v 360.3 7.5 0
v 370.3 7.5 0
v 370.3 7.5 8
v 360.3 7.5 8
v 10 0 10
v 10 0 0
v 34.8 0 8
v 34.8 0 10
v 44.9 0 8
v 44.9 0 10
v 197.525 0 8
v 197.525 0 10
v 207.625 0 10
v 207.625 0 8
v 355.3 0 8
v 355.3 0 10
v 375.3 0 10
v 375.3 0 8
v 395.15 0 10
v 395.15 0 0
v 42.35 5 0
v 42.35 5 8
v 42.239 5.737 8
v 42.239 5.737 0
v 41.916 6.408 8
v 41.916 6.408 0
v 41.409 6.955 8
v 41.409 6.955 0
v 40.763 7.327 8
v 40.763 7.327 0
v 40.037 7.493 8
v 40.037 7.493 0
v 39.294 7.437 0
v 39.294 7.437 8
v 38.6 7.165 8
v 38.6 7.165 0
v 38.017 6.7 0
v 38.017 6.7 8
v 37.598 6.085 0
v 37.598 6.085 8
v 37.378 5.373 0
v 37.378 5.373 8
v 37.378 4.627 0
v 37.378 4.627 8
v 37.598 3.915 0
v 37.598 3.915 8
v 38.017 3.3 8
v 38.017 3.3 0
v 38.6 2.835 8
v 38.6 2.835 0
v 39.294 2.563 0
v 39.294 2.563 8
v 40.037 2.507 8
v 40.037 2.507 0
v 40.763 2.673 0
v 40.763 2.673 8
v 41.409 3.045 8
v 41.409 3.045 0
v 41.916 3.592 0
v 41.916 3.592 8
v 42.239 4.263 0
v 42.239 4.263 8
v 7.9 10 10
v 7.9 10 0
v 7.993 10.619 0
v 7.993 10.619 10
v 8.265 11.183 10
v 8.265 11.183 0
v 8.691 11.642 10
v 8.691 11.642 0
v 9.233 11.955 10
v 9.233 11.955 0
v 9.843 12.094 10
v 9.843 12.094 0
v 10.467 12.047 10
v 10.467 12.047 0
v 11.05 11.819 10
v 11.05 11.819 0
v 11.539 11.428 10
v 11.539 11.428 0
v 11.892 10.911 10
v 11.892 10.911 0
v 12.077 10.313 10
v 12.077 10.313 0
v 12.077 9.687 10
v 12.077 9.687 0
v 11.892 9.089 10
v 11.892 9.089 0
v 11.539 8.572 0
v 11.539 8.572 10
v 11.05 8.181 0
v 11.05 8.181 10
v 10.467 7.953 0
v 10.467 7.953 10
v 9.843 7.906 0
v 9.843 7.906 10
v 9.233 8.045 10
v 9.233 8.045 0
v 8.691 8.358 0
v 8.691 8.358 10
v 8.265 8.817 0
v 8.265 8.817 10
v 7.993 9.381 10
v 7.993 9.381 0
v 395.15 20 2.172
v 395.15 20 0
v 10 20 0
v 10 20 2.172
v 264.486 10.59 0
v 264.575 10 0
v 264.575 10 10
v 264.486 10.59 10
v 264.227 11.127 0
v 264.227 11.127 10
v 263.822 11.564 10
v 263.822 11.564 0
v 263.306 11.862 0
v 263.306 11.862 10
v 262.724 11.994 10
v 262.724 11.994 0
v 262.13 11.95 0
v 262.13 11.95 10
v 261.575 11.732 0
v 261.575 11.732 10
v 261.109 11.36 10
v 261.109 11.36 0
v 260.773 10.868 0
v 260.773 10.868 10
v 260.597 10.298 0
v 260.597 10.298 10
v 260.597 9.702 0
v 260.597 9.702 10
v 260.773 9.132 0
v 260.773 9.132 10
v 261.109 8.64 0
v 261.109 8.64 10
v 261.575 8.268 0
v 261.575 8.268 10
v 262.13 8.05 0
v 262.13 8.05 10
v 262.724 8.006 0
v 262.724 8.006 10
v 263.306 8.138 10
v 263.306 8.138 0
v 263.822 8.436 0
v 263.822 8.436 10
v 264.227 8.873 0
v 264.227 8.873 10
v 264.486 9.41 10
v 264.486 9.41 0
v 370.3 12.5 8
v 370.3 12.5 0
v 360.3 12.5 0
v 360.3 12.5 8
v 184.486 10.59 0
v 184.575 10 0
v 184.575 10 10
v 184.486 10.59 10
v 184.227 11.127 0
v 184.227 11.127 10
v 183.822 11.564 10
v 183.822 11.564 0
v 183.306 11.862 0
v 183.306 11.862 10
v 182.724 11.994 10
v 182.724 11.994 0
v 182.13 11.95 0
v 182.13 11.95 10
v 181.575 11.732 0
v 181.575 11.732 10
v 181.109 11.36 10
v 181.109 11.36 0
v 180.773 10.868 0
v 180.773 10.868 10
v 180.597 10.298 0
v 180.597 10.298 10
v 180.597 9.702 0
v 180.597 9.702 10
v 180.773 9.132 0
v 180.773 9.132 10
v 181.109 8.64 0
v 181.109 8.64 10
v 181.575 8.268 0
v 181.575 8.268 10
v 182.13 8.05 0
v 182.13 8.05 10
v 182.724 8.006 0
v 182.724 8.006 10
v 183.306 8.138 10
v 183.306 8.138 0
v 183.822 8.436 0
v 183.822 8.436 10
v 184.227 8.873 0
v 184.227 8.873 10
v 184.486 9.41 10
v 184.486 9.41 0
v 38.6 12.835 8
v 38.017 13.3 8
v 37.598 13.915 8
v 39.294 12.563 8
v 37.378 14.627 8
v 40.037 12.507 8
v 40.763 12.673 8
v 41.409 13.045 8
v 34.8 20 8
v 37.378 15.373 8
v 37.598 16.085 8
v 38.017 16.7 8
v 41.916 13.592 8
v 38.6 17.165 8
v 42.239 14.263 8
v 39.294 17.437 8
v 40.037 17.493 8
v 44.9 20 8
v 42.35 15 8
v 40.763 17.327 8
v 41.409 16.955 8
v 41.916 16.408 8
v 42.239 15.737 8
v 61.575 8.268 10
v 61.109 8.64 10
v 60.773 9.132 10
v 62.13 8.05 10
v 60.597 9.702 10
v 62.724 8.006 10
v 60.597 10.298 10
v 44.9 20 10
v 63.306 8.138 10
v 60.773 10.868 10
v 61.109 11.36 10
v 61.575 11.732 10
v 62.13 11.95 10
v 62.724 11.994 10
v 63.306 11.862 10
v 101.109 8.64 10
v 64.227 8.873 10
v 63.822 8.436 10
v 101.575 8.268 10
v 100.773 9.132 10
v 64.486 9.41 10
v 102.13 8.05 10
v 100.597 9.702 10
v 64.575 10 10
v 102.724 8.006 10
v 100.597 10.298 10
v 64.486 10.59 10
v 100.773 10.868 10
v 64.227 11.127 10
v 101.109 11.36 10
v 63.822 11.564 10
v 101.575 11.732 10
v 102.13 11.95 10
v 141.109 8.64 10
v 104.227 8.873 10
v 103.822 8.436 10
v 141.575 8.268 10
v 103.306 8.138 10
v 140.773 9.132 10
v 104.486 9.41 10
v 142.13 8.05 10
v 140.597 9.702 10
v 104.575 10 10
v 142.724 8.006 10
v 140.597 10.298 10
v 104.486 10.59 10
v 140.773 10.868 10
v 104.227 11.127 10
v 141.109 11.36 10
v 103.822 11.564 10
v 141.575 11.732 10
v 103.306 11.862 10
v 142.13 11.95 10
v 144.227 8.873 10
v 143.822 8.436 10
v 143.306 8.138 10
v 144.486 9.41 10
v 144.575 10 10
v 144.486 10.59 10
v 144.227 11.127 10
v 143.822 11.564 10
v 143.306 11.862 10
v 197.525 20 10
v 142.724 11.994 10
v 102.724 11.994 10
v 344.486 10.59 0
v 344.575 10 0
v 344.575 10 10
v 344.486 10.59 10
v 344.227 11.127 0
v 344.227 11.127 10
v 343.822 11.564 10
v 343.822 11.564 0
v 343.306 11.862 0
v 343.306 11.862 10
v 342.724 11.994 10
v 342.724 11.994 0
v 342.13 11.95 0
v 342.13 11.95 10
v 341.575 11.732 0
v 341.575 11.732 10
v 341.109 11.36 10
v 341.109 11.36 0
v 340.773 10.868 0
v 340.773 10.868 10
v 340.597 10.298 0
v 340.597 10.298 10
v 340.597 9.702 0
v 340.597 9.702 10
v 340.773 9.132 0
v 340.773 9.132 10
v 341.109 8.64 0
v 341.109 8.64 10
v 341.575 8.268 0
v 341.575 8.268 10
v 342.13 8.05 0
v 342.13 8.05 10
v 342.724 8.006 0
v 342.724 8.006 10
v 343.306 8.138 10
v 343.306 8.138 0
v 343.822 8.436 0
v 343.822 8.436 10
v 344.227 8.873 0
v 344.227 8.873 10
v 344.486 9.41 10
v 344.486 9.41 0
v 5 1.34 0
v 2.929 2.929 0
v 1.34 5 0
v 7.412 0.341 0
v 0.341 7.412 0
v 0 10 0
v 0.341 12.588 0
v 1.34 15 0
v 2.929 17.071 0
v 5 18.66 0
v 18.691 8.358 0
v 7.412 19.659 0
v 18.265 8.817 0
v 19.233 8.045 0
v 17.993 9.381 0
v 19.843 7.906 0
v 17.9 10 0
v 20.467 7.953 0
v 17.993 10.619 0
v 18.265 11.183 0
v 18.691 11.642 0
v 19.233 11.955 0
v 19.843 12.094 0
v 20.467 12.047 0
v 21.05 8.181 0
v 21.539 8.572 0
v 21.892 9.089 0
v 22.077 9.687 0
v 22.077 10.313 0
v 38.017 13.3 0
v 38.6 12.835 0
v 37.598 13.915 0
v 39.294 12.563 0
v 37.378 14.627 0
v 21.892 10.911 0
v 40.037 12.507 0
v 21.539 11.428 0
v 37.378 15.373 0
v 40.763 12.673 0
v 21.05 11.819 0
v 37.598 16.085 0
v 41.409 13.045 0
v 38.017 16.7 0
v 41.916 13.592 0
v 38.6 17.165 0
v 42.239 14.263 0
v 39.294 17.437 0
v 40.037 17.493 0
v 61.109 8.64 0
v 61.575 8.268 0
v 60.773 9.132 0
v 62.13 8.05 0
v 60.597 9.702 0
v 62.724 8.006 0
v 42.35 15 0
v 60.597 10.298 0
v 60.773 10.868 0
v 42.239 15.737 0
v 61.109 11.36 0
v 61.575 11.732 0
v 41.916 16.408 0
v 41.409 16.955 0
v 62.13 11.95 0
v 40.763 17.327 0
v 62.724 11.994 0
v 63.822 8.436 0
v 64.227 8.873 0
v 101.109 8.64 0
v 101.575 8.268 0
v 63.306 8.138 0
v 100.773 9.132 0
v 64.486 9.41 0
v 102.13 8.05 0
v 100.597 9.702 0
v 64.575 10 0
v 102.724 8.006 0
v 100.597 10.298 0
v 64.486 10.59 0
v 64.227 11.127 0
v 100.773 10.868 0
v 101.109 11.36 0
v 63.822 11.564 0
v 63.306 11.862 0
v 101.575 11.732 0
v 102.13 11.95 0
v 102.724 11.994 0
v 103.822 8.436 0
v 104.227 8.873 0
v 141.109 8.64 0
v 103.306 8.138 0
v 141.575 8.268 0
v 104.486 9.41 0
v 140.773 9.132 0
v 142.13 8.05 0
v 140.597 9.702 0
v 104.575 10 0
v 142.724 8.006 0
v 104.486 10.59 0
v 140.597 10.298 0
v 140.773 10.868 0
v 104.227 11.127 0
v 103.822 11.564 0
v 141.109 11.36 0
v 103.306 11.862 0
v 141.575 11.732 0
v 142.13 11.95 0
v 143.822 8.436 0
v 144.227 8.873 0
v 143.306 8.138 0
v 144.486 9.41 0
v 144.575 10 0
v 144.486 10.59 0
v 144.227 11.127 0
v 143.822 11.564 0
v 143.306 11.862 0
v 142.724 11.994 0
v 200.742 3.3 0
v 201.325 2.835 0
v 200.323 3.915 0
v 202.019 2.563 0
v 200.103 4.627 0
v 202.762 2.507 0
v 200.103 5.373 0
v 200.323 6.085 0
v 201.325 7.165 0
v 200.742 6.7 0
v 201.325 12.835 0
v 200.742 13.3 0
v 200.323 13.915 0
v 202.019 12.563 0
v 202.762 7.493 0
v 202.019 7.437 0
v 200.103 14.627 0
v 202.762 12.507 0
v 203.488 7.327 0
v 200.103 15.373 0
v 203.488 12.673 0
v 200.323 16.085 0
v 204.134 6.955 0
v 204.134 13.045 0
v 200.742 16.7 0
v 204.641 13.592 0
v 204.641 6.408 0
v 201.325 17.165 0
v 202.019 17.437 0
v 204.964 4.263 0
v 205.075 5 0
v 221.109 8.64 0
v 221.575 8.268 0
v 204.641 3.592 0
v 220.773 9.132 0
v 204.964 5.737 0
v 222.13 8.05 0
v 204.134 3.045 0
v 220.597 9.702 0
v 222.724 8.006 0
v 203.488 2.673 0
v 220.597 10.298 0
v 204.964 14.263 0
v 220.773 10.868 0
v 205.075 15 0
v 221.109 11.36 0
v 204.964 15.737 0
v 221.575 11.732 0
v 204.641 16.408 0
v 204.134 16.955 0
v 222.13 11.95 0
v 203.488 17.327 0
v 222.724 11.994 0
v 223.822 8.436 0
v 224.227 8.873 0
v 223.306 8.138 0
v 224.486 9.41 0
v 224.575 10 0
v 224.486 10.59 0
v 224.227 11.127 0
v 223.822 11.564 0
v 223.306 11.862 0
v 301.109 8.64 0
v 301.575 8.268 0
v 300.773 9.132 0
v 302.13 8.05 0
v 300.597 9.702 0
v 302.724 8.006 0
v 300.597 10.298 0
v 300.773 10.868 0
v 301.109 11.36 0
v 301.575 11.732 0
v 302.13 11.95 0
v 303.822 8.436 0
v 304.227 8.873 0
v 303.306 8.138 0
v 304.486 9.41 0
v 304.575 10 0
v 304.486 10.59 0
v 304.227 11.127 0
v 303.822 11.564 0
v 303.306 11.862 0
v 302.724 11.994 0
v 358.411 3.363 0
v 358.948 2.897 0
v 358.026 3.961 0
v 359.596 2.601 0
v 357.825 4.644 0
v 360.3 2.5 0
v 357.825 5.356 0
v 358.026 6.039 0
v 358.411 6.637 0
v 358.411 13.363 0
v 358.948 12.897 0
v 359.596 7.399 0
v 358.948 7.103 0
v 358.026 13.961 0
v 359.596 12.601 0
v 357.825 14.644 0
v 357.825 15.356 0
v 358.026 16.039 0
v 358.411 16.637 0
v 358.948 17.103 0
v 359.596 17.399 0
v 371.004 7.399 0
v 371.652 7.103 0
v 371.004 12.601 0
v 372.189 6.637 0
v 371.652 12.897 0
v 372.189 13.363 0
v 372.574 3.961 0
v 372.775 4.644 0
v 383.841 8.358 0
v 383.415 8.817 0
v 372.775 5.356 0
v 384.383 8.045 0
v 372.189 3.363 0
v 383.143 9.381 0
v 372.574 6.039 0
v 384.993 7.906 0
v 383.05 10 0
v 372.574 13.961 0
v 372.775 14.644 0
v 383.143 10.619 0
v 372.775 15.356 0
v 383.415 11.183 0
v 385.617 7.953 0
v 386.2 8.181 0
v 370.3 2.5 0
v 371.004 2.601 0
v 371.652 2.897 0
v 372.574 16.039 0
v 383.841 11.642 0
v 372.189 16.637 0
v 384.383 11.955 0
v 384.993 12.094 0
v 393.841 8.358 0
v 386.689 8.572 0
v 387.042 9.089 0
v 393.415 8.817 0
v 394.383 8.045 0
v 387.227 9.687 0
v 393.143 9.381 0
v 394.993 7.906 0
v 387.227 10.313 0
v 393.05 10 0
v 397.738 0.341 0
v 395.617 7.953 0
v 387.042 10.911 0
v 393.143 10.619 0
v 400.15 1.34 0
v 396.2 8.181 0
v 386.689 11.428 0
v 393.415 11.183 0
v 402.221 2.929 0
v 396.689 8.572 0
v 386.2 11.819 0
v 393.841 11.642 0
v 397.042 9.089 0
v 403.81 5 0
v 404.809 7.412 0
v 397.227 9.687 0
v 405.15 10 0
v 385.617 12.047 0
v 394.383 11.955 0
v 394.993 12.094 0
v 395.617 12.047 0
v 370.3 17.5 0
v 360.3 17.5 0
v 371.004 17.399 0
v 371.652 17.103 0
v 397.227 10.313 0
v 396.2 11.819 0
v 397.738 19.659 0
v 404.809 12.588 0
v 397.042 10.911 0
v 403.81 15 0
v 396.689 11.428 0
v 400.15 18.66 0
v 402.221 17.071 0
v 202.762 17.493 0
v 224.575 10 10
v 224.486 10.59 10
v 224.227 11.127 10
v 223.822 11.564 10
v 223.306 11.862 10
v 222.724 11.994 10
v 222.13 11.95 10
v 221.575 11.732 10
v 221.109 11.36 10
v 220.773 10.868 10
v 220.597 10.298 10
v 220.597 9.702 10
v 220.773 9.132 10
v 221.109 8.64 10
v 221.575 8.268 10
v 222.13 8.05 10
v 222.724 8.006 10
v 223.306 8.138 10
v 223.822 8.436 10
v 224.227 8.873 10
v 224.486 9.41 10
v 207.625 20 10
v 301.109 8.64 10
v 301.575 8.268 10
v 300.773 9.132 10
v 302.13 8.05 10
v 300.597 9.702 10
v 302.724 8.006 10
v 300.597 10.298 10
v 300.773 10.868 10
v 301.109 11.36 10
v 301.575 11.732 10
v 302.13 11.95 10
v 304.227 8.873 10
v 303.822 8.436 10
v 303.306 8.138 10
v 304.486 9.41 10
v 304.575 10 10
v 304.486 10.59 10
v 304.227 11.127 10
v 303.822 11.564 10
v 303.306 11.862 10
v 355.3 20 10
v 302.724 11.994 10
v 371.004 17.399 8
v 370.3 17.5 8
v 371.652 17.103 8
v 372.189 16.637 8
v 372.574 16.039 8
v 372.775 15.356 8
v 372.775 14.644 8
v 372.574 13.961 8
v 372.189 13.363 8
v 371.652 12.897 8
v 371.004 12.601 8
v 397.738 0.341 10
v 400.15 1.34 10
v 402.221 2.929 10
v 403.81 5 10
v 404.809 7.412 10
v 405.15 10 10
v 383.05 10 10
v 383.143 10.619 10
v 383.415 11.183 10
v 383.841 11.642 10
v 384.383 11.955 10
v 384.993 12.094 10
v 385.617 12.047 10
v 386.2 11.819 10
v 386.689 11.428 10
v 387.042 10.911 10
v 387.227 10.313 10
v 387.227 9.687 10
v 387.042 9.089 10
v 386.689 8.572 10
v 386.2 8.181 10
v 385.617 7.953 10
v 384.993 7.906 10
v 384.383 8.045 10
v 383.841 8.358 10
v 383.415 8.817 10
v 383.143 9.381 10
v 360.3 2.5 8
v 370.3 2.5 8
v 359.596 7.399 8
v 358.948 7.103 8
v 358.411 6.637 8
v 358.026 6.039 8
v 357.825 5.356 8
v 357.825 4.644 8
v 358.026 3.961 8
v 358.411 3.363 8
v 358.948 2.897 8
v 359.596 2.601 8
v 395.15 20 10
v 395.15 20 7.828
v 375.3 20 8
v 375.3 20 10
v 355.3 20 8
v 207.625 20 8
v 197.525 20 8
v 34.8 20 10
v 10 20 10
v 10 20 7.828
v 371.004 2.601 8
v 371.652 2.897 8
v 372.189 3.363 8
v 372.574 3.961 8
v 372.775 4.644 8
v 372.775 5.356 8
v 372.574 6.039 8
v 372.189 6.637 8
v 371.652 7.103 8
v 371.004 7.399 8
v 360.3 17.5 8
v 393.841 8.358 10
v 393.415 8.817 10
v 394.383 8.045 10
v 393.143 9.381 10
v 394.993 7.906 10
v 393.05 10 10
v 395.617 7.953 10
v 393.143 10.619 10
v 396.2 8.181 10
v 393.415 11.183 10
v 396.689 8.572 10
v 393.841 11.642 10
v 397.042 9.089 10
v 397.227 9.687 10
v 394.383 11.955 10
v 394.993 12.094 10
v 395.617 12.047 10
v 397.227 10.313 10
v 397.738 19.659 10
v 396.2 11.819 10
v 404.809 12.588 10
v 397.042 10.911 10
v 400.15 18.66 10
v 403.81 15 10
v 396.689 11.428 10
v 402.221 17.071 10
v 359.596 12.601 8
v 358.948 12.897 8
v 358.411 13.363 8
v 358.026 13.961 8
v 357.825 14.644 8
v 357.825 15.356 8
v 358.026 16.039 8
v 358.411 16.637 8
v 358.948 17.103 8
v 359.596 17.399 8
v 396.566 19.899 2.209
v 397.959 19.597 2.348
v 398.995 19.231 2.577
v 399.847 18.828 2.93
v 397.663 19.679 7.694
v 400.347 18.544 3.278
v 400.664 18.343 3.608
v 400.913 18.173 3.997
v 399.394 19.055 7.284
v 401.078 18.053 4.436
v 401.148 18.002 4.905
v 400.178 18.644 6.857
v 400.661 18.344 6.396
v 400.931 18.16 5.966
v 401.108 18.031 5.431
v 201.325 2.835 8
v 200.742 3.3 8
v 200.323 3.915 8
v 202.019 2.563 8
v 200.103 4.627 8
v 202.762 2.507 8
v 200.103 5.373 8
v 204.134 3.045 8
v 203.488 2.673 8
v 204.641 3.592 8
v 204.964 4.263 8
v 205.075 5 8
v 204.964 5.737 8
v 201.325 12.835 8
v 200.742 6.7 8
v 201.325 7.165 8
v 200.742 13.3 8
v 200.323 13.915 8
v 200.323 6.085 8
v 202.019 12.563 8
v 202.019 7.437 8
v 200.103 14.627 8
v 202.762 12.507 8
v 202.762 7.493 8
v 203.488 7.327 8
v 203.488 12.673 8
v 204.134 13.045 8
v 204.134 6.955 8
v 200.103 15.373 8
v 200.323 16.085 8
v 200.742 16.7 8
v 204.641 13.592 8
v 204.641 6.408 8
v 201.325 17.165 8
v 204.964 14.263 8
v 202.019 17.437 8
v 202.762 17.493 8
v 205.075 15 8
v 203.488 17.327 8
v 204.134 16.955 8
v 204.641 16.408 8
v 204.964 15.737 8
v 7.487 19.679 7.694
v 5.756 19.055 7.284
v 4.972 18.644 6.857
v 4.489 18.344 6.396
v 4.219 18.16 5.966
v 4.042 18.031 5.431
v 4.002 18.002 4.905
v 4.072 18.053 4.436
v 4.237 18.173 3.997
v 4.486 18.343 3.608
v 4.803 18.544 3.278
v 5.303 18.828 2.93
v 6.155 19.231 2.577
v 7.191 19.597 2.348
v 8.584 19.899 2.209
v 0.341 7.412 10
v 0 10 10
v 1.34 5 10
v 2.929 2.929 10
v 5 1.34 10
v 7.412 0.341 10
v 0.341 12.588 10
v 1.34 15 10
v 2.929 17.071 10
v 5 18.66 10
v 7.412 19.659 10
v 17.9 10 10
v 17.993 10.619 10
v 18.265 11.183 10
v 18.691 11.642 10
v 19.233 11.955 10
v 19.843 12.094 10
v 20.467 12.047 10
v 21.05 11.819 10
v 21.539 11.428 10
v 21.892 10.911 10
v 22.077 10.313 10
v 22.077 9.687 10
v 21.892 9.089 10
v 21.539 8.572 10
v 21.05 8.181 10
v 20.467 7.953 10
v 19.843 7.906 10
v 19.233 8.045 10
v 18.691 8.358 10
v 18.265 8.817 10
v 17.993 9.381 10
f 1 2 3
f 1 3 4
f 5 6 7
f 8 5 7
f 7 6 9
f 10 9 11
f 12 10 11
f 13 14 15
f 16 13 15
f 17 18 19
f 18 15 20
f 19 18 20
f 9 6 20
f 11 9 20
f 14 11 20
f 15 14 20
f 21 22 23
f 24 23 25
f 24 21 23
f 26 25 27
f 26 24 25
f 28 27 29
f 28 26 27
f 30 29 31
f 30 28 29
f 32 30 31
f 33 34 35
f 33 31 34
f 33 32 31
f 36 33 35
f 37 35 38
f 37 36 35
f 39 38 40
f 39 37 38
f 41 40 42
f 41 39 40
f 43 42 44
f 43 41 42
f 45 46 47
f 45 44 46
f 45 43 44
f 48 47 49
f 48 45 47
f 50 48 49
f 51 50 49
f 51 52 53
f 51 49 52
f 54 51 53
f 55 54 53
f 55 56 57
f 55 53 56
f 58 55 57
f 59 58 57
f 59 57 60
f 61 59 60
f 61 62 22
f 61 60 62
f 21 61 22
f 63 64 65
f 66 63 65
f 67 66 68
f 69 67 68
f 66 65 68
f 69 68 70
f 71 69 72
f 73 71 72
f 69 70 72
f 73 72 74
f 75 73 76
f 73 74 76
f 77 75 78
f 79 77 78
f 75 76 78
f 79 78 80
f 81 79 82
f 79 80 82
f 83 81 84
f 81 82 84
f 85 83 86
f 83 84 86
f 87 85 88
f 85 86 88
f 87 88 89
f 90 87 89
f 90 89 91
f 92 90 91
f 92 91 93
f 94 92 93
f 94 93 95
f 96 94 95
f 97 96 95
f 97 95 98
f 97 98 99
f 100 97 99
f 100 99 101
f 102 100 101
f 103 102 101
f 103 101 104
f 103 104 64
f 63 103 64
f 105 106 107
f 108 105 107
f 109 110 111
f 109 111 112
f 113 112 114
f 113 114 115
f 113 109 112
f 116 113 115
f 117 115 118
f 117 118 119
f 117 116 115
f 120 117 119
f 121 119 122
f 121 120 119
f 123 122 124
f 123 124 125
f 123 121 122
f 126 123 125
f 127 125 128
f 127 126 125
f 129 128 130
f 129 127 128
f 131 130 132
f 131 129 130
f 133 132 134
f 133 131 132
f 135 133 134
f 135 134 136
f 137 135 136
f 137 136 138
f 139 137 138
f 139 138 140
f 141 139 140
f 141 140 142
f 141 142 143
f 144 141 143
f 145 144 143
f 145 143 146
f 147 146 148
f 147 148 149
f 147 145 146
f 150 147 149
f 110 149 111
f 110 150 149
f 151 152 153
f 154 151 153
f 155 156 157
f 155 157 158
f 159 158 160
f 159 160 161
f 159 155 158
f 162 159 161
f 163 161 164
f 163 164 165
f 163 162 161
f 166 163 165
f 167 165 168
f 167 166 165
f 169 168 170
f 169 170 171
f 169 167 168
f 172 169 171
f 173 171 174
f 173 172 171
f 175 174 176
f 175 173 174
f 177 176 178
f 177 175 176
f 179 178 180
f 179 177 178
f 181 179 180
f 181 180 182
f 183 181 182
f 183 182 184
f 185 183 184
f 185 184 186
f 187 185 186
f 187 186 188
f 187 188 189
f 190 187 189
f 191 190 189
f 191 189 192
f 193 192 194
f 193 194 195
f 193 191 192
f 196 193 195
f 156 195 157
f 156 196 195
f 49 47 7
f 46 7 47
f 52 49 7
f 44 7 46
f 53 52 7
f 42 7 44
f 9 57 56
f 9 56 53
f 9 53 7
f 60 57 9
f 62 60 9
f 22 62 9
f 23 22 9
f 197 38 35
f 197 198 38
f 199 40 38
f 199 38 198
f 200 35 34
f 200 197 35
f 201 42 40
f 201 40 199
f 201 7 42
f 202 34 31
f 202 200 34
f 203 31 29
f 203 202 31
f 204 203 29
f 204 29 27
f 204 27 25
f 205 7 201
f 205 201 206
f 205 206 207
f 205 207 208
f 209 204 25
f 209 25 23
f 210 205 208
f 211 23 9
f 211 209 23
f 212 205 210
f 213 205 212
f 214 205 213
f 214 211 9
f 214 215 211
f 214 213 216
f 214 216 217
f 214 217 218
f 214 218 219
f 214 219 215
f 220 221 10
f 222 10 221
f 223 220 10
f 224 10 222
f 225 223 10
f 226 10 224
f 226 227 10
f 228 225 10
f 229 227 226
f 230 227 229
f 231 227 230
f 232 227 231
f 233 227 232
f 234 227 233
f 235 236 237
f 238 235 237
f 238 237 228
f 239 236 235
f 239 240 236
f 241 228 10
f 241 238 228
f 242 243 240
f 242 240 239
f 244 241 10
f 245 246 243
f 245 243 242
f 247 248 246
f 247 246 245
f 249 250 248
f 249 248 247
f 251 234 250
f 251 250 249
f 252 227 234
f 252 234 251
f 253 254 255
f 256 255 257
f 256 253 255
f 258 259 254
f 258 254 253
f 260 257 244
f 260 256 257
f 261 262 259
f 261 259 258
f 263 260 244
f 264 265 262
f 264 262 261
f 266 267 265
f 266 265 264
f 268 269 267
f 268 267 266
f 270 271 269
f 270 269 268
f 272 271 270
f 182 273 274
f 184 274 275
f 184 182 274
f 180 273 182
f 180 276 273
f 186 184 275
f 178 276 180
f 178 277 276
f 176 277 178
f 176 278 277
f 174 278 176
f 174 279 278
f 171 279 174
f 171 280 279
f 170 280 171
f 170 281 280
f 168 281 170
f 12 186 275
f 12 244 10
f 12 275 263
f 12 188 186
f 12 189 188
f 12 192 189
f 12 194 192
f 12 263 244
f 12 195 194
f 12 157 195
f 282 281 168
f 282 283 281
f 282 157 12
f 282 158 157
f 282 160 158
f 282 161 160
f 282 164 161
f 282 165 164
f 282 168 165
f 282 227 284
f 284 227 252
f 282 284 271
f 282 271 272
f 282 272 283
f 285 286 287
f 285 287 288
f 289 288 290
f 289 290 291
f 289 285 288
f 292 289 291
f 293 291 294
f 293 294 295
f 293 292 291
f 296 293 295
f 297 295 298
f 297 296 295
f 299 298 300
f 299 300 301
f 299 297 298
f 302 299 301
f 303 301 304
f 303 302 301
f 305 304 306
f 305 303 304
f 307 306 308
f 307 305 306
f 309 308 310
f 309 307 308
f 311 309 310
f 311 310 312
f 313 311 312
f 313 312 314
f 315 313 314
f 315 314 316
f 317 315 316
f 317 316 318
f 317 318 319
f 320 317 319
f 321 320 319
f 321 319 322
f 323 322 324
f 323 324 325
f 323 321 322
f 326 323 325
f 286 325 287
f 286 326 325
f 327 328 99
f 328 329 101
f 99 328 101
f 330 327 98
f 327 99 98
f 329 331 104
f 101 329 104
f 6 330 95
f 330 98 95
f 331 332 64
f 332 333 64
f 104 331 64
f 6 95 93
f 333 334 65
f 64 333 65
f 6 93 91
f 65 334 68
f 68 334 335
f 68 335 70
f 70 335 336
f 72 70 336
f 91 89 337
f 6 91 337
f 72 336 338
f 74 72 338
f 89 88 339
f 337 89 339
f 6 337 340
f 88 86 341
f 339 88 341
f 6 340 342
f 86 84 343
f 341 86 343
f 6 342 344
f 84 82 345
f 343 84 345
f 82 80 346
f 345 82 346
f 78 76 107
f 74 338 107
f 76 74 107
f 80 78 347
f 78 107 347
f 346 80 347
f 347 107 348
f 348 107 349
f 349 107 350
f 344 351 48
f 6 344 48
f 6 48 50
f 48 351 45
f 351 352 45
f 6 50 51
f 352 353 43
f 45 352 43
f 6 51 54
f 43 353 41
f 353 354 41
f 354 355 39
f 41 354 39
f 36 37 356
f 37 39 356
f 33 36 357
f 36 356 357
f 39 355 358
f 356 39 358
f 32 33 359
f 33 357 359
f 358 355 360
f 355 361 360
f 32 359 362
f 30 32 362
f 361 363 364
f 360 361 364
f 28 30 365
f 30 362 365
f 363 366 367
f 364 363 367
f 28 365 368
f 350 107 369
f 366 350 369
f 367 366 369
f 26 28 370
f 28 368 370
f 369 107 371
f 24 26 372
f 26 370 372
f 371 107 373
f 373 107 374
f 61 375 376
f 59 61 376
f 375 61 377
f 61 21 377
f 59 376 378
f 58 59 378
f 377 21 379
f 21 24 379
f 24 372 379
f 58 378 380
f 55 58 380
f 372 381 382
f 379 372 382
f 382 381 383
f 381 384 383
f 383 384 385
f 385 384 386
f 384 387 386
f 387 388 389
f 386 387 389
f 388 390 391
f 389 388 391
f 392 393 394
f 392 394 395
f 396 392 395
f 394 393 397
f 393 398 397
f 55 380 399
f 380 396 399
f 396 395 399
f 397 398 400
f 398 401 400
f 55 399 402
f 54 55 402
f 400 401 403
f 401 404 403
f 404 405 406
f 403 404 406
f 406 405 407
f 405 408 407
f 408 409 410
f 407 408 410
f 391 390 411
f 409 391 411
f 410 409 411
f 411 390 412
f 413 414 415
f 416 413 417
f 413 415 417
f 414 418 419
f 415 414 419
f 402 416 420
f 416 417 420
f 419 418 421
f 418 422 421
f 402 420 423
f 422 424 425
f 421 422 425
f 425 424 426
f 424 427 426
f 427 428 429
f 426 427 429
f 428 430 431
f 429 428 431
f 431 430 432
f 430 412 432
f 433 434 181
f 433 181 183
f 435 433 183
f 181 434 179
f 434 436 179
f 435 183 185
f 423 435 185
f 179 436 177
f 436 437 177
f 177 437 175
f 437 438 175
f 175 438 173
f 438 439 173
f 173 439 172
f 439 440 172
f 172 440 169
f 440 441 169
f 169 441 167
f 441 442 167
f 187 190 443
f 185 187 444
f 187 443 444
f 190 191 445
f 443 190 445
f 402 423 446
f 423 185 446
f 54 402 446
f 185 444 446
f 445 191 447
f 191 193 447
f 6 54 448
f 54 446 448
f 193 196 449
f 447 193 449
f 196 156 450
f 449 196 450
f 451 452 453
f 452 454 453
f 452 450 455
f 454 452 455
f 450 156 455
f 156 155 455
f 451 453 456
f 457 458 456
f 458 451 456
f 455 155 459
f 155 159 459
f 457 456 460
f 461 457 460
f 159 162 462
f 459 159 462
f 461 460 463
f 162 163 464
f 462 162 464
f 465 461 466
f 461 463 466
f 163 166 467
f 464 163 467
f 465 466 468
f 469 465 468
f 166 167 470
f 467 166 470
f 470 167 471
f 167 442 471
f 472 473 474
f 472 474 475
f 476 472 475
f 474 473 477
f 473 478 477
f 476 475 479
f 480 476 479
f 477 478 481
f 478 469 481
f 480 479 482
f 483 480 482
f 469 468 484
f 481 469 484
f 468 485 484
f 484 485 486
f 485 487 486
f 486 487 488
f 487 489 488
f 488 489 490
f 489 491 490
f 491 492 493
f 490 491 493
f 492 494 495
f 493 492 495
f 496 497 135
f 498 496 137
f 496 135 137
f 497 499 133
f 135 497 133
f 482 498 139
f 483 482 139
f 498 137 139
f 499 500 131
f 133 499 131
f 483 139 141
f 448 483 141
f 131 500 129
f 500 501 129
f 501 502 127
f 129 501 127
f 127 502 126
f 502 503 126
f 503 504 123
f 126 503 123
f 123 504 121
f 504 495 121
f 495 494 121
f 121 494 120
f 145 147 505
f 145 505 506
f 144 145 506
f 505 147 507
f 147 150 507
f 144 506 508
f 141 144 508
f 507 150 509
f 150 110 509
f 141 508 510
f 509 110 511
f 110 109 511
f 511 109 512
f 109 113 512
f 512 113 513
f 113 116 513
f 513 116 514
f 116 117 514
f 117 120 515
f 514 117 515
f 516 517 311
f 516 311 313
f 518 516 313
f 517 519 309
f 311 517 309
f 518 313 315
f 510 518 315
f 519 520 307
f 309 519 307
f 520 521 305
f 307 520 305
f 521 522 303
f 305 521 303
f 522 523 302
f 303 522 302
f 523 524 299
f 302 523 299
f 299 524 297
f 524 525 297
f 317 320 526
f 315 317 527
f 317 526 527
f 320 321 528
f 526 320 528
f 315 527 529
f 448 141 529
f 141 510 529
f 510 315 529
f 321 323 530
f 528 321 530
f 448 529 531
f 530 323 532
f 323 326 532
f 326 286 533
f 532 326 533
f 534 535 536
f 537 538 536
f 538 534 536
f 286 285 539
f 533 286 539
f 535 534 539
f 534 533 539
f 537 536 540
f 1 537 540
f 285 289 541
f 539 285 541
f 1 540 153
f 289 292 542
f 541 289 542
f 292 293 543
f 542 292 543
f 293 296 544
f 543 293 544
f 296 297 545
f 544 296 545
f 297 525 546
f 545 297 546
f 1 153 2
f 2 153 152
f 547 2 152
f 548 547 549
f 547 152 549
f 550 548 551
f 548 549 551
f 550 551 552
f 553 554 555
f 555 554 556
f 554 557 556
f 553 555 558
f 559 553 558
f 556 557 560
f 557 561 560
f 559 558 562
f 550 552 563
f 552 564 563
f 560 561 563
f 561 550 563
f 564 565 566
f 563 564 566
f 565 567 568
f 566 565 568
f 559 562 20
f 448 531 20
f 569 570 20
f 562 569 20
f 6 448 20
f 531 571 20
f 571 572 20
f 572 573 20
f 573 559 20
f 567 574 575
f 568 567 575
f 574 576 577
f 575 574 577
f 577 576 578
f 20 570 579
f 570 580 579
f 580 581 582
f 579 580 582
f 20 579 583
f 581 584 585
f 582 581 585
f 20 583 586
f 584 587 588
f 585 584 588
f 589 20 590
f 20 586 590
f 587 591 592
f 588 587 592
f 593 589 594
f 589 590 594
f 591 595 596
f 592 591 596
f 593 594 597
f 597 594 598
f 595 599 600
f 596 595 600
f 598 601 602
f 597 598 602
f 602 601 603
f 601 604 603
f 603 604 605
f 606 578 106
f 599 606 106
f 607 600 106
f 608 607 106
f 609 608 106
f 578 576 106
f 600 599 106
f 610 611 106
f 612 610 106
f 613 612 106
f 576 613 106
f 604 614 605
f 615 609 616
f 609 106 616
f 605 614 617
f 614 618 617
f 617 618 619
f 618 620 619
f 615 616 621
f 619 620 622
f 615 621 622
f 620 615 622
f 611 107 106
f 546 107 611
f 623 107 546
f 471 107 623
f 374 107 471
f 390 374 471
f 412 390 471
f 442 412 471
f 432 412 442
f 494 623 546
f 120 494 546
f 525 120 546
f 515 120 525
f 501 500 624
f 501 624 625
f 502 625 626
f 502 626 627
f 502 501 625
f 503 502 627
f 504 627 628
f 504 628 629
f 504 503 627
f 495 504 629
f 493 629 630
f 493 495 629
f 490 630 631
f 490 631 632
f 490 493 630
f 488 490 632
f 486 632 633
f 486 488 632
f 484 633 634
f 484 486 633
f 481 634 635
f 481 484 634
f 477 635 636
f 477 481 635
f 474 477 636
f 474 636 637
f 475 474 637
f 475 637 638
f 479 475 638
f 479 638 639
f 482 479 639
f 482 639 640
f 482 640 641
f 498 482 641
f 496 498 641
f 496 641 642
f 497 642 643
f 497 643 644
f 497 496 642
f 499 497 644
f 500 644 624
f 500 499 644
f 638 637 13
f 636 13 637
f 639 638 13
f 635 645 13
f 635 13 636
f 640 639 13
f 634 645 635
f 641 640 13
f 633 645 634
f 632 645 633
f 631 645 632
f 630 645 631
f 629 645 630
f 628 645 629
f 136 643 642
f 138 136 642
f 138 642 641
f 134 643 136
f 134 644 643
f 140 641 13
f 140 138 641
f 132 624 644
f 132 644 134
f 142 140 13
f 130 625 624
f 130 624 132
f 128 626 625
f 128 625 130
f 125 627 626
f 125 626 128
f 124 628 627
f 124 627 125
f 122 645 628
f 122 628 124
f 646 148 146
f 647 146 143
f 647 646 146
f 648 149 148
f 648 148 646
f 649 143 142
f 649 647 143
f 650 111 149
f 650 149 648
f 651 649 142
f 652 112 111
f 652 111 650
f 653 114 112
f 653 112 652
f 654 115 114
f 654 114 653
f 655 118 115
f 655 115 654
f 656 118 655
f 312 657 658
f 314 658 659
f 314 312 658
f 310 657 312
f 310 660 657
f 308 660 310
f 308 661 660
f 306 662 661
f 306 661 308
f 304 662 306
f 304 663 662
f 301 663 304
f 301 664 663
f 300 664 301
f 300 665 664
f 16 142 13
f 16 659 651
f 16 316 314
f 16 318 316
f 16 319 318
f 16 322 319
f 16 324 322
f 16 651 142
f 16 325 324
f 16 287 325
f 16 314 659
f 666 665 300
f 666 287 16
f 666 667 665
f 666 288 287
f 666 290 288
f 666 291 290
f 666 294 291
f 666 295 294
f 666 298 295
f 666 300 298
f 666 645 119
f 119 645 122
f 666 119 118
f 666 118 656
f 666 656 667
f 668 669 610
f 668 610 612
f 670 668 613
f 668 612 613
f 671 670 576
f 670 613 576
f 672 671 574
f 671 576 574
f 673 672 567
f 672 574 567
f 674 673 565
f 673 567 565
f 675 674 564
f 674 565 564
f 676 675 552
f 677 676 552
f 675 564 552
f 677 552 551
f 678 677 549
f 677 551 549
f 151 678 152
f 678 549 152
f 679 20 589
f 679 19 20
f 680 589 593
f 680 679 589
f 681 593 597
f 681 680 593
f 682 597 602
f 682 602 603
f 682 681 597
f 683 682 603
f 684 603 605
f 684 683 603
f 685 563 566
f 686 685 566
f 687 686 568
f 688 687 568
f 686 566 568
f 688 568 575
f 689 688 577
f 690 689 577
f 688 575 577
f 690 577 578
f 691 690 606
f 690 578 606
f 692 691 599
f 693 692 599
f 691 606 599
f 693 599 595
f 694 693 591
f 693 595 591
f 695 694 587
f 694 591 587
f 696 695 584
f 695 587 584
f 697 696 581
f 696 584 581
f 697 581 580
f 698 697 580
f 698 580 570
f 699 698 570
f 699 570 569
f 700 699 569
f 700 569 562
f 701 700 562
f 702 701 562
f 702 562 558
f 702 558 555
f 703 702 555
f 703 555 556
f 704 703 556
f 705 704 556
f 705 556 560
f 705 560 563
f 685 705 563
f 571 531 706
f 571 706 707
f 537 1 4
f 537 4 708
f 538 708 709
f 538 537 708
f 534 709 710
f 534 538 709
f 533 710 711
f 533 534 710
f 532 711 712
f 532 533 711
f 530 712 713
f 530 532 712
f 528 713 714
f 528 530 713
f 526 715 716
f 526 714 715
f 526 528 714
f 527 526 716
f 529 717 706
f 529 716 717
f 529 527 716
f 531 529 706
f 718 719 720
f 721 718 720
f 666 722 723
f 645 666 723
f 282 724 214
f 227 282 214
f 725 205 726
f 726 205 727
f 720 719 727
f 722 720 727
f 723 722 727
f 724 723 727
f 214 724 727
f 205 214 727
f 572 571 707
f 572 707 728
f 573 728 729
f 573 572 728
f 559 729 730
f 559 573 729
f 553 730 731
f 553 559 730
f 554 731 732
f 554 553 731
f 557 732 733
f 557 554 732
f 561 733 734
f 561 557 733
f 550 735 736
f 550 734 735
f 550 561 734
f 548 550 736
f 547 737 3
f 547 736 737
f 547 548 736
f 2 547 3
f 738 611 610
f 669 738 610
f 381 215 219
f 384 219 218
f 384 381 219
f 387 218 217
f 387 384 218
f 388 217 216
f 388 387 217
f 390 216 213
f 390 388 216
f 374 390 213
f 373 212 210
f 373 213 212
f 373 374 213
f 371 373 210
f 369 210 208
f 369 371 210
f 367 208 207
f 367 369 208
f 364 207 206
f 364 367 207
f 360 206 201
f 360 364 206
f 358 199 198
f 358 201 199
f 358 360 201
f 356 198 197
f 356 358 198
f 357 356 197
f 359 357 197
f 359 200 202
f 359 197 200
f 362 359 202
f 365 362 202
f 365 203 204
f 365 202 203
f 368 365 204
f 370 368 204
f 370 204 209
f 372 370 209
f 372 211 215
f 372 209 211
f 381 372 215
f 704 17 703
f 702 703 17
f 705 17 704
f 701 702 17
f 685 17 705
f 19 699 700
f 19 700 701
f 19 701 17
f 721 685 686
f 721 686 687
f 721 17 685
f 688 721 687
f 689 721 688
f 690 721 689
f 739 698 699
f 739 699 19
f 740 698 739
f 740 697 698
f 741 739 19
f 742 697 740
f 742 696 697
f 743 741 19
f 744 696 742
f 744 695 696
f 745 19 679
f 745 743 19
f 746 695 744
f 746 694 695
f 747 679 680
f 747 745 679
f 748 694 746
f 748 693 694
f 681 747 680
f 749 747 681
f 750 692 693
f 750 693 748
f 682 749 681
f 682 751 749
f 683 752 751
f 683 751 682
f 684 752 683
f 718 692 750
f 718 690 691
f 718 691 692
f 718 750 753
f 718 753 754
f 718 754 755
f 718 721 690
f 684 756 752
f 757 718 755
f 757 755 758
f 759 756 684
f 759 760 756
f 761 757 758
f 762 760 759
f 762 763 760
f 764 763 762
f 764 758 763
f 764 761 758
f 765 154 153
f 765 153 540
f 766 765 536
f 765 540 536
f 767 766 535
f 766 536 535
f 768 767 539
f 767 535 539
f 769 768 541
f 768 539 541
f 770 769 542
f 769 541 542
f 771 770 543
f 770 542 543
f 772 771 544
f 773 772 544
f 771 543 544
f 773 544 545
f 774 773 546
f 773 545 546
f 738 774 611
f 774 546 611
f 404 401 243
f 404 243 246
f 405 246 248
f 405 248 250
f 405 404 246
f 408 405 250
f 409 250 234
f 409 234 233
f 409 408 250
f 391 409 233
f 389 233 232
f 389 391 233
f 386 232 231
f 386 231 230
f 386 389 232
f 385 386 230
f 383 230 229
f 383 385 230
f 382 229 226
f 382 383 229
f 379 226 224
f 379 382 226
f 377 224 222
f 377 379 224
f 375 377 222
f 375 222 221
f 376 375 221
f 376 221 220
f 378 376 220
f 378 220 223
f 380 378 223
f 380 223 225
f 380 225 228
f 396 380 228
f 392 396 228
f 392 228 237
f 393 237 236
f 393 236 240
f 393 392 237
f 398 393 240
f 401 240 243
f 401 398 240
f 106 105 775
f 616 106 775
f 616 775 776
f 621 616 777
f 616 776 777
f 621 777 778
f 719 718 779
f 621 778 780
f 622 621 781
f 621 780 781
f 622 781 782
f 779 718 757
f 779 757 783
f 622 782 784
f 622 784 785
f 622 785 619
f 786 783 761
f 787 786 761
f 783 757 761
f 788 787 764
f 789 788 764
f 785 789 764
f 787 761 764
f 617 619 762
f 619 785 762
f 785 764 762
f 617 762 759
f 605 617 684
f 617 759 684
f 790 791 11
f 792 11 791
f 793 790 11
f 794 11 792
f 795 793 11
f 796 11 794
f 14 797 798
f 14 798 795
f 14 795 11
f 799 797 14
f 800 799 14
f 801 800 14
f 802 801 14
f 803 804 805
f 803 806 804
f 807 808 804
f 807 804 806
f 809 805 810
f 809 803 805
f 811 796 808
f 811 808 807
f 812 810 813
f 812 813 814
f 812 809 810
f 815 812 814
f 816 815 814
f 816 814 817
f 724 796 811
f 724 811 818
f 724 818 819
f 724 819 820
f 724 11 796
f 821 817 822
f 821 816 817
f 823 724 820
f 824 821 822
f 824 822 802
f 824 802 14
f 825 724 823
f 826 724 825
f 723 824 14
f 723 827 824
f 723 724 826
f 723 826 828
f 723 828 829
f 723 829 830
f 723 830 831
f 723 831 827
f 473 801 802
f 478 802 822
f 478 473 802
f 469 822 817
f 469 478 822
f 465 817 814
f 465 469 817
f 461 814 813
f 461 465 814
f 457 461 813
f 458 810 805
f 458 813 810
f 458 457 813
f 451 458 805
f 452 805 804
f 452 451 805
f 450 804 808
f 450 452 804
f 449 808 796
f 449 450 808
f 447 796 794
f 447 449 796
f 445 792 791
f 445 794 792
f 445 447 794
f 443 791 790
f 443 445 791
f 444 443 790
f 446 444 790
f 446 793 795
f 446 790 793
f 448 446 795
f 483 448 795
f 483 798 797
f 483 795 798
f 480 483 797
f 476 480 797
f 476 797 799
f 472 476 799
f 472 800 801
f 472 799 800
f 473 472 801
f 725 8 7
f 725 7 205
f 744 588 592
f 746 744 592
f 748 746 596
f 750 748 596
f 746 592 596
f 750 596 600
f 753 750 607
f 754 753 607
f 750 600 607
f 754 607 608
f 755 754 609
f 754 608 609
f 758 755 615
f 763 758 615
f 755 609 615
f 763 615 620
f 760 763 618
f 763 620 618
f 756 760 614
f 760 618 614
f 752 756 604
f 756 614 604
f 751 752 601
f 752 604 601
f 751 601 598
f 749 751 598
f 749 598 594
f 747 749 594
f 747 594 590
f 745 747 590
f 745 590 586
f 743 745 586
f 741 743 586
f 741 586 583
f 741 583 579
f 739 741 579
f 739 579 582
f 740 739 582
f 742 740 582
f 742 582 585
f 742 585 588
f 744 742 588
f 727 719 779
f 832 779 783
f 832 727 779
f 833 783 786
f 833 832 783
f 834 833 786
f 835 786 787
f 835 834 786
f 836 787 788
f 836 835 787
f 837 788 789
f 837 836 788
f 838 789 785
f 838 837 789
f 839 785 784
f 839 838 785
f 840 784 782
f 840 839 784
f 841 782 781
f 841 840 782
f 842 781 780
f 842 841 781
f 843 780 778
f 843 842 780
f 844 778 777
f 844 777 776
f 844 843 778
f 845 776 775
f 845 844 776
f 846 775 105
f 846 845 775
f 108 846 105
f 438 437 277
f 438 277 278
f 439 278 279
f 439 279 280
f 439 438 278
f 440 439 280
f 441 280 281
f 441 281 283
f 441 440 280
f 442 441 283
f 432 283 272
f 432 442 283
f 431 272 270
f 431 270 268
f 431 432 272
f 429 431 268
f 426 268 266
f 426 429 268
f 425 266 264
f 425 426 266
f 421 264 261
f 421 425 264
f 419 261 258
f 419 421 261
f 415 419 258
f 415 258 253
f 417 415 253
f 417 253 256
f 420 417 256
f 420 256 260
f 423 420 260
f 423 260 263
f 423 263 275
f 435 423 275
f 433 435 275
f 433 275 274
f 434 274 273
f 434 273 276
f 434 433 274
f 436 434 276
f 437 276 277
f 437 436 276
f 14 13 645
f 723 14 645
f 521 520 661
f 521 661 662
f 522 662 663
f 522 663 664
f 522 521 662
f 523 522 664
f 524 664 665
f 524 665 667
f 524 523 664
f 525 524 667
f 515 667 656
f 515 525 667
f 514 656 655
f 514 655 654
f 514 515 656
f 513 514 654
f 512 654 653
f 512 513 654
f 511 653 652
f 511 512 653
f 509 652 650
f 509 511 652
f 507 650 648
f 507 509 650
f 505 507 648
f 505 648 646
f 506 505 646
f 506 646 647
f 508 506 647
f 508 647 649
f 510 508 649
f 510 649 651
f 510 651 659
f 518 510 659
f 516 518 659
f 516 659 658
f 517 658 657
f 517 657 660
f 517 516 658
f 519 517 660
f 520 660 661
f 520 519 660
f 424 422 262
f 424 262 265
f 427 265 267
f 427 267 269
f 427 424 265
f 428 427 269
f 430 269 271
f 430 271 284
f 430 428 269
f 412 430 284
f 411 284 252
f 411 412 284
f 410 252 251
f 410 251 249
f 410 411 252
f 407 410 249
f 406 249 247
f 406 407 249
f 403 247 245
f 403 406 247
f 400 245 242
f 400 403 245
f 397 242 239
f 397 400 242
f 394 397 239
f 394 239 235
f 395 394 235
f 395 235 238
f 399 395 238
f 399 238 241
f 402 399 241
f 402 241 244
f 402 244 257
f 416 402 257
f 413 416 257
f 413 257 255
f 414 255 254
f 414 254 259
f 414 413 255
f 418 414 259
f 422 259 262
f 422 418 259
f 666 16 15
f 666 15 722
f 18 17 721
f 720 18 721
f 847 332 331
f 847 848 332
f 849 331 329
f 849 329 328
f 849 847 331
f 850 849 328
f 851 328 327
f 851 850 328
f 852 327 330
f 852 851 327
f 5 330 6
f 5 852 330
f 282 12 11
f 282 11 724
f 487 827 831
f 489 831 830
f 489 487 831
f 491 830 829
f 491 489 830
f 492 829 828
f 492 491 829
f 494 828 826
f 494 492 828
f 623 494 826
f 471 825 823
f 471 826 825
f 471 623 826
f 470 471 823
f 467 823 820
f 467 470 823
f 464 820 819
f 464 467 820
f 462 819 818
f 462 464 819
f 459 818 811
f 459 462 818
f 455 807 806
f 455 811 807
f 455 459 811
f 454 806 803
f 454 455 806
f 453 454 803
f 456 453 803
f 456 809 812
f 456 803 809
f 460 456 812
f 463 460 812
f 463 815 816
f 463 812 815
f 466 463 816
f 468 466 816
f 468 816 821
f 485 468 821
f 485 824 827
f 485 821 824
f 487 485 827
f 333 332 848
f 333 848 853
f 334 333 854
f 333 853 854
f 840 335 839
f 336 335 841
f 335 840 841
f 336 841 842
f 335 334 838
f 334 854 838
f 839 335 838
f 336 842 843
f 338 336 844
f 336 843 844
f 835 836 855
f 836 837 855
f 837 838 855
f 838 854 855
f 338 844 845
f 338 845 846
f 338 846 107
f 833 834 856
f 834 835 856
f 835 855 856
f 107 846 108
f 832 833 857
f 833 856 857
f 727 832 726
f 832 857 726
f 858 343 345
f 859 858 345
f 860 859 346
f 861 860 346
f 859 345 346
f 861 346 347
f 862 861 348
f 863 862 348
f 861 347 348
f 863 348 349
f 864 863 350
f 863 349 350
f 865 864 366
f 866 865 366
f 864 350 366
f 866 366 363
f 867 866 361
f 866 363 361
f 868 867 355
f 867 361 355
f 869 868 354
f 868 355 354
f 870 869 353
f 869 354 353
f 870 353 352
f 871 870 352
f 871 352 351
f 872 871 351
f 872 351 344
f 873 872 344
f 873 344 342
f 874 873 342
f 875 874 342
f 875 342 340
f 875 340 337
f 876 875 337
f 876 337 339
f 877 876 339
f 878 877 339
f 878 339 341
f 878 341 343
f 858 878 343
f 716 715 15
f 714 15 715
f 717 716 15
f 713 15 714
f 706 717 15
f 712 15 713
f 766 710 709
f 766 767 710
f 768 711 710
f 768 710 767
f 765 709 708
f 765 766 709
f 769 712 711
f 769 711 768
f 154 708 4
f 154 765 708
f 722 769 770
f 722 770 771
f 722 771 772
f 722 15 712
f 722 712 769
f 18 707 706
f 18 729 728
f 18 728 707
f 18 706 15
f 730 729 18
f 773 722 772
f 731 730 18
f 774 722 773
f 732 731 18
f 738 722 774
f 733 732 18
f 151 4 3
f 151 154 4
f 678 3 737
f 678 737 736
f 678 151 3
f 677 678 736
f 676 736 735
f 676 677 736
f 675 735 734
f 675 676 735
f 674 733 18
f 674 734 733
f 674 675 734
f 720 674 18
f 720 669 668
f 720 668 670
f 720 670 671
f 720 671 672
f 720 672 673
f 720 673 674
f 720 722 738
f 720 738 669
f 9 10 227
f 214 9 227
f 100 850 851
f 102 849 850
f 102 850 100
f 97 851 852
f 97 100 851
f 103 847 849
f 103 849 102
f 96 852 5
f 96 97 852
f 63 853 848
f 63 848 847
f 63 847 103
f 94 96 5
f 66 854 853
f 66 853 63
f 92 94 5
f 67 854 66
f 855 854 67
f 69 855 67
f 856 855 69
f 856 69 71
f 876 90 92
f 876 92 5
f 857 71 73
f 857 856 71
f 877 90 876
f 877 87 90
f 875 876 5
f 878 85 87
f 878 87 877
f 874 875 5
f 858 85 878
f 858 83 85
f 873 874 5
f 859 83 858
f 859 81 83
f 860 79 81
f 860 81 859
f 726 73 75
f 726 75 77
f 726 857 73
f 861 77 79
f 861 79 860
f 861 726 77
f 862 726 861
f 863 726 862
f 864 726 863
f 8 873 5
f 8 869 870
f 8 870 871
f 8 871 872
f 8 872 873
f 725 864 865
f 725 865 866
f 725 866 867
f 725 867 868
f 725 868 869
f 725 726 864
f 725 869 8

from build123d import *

# Parameters (mm, degrees)
ESQUISSE1_R             = 2.5
ESQUISSE1_R_2           = 2
BOSS_EXTRU_1_DEPTH      = 10
CONG_1_R                = 10
TROU_TARAUD_M5X0_81_D   = 4.2
ESQUISSE5_W             = 10.1
ESQUISSE5_H             = 20
ESQUISSE5_W_2           = 20
ENL_V_MAT_EXTRU_1_DEPTH = 2
ESQUISSE6_R             = 3
ENL_V_MAT_EXTRU_3_DEPTH = 406.766586229


with BuildPart() as part:
    # Esquisse1 → Boss.-Extru.1 (new body)
    with BuildSketch(Plane.XY):
        Polygon((0, 20), (0, 0), (60, 0), (385.15, 0), (405.15, 0), (405.15, 20), (385.15, 20), (60, 20), align=None)
        with Locations((202.575, 15)):
            Circle(ESQUISSE1_R, mode=Mode.SUBTRACT)
        with Locations((202.575, 5)):
            Circle(ESQUISSE1_R, mode=Mode.SUBTRACT)
        with Locations((39.85, 5)):
            Circle(ESQUISSE1_R, mode=Mode.SUBTRACT)
        with Locations((39.85, 15)):
            Circle(ESQUISSE1_R, mode=Mode.SUBTRACT)
        with Locations((222.575, 10)):
            Circle(ESQUISSE1_R_2, mode=Mode.SUBTRACT)
        with Locations((262.575, 10)):
            Circle(ESQUISSE1_R_2, mode=Mode.SUBTRACT)
        with Locations((302.575, 10)):
            Circle(ESQUISSE1_R_2, mode=Mode.SUBTRACT)
        with Locations((342.575, 10)):
            Circle(ESQUISSE1_R_2, mode=Mode.SUBTRACT)
        with Locations((182.575, 10)):
            Circle(ESQUISSE1_R_2, mode=Mode.SUBTRACT)
        with Locations((142.575, 10)):
            Circle(ESQUISSE1_R_2, mode=Mode.SUBTRACT)
        with Locations((102.575, 10)):
            Circle(ESQUISSE1_R_2, mode=Mode.SUBTRACT)
        with Locations((62.575, 10)):
            Circle(ESQUISSE1_R_2, mode=Mode.SUBTRACT)
        with BuildLine():
            Line((360.3, 17.5), (370.3, 17.5))
            ThreePointArc((370.3, 17.5), (372.8, 15), (370.3, 12.5))
            Line((370.3, 12.5), (360.3, 12.5))
            ThreePointArc((360.3, 12.5), (357.8, 15), (360.3, 17.5))
        make_face(mode=Mode.SUBTRACT)
        with BuildLine():
            Line((360.3, 2.5), (370.3, 2.5))
            ThreePointArc((370.3, 2.5), (372.8, 5), (370.3, 7.5))
            Line((370.3, 7.5), (360.3, 7.5))
            ThreePointArc((360.3, 7.5), (357.8, 5), (360.3, 2.5))
        make_face(mode=Mode.SUBTRACT)
    extrude(amount=BOSS_EXTRU_1_DEPTH)

    # Congé1
    cong_1_edges = [part.edges().sort_by_distance(p)[0] for p in [
        (0, 0, 5),
        (0, 20, 5),
        (405.15, 0, 5),
        (405.15, 20, 5),
    ]]
    fillet(cong_1_edges, radius=CONG_1_R - 0.0001)  # a hair under: the kernel refuses the full size

    # Trou taraudé M5x0.81 (through all)
    with Locations(Plane.XY.offset(10)):
        with Locations((385.15, 10), (395.15, 10), (10, 10), (20, 10)):
            Hole(TROU_TARAUD_M5X0_81_D / 2)

    # Esquisse5 → Enlèv. mat.-Extru.1 (cut)
    with BuildSketch(Plane.XY.offset(10)):
        with Locations((202.575, 10)):
            Rectangle(ESQUISSE5_W, ESQUISSE5_H)
        with Locations((365.3, 10)):
            Rectangle(ESQUISSE5_W_2, ESQUISSE5_H)
        with Locations((39.85, 10)):
            Rectangle(ESQUISSE5_W, ESQUISSE5_H)
    extrude(amount=-ENL_V_MAT_EXTRU_1_DEPTH, mode=Mode.SUBTRACT)

    # Esquisse6 → Enlèv. mat.-Extru.3 (cut, through all)
    with BuildSketch(Plane(origin=(0, 0, 0), x_dir=(0, 0, -1), z_dir=(1, 0, 0))):
        with Locations((-5, 21)):
            Circle(ESQUISSE6_R)
    extrude(amount=ENL_V_MAT_EXTRU_3_DEPTH, mode=Mode.SUBTRACT)


solid = part.part
